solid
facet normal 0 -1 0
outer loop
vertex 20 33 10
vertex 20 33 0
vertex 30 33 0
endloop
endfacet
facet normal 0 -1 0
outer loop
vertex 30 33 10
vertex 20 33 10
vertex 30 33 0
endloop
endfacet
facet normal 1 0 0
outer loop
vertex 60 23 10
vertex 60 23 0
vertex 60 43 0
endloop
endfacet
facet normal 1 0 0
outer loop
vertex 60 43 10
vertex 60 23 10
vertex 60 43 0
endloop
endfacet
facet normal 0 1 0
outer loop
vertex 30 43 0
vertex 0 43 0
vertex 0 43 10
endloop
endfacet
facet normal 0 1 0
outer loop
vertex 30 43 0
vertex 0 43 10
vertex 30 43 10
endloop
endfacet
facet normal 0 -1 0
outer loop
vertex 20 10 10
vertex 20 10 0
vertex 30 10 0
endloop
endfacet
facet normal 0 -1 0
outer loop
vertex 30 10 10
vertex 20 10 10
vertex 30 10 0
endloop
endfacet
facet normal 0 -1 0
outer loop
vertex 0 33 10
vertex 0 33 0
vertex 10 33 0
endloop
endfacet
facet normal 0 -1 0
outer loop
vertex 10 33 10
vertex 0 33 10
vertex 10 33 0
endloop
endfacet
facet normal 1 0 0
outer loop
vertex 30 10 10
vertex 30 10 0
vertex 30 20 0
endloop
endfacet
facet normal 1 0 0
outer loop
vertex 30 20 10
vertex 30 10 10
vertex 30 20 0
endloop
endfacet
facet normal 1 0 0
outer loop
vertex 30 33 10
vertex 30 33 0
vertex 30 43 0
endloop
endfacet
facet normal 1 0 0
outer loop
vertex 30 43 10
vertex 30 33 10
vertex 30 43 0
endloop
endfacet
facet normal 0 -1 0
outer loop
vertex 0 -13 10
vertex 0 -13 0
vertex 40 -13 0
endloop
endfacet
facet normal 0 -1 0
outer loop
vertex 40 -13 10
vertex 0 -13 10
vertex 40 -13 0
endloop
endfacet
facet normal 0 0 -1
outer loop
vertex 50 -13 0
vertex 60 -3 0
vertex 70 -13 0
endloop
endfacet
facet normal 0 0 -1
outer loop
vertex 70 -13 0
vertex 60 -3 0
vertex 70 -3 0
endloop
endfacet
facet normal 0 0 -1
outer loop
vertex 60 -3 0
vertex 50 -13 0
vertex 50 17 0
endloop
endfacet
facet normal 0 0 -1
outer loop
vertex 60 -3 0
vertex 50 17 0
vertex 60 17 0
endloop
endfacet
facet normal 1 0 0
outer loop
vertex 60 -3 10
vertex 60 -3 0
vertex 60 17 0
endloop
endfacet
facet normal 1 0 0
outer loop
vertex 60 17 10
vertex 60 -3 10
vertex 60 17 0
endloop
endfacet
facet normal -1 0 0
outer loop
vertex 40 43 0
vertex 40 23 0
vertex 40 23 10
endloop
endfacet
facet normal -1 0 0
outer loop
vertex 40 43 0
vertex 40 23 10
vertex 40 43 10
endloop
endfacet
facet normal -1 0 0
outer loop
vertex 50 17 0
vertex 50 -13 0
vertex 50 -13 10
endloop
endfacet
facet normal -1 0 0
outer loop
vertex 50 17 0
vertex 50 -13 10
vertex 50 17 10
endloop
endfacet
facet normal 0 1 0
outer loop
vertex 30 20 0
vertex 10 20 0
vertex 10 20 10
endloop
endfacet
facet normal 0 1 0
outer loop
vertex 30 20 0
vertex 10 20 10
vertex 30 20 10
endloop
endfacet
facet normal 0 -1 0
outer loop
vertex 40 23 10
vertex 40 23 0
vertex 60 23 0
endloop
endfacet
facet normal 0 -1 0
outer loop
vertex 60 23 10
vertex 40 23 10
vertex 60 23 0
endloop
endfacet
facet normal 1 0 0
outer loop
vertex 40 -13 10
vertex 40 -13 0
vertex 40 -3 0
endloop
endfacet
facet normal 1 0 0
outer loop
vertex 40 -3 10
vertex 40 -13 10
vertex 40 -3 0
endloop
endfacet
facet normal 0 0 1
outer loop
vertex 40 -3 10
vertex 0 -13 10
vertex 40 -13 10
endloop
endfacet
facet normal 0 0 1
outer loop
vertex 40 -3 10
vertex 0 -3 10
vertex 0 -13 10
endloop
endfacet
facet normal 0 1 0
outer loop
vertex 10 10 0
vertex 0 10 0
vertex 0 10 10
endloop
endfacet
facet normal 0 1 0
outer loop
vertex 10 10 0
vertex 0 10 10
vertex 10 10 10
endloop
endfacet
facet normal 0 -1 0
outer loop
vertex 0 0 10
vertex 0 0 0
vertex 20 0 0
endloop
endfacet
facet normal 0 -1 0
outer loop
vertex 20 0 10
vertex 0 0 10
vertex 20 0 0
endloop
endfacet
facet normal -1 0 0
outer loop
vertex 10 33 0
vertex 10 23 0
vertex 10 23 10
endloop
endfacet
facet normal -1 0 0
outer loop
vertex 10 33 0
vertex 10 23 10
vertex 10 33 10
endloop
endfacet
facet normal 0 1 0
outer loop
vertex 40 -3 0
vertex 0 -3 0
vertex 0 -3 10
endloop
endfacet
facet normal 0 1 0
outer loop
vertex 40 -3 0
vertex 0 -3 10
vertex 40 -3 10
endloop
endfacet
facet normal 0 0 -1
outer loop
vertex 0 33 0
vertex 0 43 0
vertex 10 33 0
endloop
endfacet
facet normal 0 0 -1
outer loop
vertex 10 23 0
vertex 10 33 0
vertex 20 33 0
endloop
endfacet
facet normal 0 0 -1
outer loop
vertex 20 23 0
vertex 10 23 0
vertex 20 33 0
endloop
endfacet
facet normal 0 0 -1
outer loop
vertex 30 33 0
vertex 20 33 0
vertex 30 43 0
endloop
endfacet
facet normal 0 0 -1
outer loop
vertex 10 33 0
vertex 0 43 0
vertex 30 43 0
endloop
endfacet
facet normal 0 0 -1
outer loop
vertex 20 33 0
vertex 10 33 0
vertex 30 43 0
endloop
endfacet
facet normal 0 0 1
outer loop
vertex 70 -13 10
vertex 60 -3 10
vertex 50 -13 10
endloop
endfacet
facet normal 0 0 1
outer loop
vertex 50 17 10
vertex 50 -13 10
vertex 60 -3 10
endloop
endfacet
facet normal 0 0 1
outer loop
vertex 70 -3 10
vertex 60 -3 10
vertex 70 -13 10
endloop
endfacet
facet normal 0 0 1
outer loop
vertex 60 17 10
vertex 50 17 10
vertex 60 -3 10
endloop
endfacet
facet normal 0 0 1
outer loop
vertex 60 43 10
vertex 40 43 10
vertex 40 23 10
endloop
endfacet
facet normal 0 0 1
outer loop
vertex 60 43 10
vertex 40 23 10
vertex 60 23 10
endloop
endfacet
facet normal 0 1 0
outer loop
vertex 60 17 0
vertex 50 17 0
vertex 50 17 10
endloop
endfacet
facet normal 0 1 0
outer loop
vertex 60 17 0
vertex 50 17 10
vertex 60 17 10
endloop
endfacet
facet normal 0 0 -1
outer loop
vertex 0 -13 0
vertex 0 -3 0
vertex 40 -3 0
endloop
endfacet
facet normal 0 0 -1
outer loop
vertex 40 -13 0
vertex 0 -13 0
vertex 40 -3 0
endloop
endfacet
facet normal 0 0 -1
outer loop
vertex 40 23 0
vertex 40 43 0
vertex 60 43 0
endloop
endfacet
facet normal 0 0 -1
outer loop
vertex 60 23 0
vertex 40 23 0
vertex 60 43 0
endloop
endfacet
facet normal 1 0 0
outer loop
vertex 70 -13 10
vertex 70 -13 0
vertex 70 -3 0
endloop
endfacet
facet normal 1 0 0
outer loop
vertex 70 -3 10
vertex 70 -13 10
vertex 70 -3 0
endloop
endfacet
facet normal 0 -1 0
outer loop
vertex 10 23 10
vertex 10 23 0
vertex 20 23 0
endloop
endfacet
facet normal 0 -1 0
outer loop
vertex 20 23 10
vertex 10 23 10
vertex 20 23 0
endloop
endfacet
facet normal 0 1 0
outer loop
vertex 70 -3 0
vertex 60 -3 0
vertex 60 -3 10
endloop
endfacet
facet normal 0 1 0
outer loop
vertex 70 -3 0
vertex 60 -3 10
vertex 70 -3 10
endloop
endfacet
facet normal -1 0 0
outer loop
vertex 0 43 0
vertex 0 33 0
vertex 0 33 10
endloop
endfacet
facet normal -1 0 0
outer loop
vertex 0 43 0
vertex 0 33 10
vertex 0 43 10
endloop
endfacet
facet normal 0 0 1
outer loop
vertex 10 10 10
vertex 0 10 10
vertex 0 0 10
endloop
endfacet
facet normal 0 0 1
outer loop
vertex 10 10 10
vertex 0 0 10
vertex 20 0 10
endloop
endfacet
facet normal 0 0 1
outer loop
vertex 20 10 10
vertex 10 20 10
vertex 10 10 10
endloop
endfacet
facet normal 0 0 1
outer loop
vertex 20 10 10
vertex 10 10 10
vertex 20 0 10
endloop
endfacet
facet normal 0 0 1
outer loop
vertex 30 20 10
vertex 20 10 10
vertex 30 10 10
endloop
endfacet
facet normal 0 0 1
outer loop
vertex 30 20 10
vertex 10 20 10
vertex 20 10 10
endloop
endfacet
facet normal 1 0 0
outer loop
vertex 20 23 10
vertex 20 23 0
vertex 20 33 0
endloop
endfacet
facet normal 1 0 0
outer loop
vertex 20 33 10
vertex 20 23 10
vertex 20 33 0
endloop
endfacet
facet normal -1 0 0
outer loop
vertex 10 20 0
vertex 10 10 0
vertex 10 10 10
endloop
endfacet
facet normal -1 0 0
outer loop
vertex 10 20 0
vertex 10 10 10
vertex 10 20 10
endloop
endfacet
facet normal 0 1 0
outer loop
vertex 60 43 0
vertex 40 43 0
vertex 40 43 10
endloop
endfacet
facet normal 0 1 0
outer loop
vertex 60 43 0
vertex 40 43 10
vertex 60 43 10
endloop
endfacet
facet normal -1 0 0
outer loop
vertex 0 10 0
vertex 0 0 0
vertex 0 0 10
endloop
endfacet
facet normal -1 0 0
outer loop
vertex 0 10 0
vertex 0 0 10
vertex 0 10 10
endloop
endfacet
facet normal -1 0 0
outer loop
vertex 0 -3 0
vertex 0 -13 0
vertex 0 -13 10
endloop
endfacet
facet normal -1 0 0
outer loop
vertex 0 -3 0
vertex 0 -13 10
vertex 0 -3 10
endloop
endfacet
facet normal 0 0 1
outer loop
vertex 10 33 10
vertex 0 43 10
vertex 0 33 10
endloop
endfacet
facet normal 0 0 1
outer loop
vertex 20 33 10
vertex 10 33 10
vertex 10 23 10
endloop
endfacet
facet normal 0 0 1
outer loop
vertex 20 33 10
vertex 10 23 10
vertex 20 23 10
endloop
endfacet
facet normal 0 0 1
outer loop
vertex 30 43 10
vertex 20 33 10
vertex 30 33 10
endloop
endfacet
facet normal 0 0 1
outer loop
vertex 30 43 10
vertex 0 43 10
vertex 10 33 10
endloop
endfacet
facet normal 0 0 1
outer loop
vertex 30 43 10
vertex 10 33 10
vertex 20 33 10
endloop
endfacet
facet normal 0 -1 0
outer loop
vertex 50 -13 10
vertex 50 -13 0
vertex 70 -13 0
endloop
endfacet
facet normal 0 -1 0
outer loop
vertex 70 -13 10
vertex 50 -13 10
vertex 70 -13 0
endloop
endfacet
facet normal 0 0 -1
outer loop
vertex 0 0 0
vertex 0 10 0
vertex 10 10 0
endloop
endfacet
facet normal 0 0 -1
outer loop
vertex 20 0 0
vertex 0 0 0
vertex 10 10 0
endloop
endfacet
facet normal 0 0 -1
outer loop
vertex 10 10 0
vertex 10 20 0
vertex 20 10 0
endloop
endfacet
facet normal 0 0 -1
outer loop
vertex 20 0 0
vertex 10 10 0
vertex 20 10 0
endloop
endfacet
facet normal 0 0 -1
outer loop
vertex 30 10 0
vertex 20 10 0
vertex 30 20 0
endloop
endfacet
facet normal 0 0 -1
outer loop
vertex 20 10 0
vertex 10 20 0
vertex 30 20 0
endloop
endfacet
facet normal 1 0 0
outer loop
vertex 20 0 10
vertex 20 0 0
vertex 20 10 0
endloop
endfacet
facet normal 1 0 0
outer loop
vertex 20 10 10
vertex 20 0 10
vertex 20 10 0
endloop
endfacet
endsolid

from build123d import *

# Parameters (mm, degrees)
BOX001_W     = 10
BOX001_H     = 10
BOX001_DEPTH = 10
BOX002_W     = 10
BOX002_H     = 10
BOX002_DEPTH = 10
BOX003_W     = 10
BOX003_H     = 10
BOX003_DEPTH = 10
BOX_W        = 10
BOX_H        = 10
BOX_DEPTH    = 10
BOX004_W     = 10
BOX004_H     = 10
BOX004_DEPTH = 10
BOX005_W     = 10
BOX005_H     = 10
BOX005_DEPTH = 10
BOX006_W     = 10
BOX006_H     = 10
BOX006_DEPTH = 10
BOX007_W     = 10
BOX007_H     = 10
BOX007_DEPTH = 10
BOX008_W     = 20
BOX008_H     = 10
BOX008_DEPTH = 10
BOX009_W     = 10
BOX009_H     = 20
BOX009_DEPTH = 10
BOX010_W     = 20
BOX010_H     = 20
BOX010_DEPTH = 10
BOX011_W     = 30
BOX011_H     = 10
BOX011_DEPTH = 10
BOX012_W     = 10
BOX012_H     = 10
BOX012_DEPTH = 10


with BuildPart() as cubo2:
    # Box001 → Box001 (new body)
    with BuildSketch(Plane(origin=(10, 0, 0), x_dir=(1, 0, 0), z_dir=(0, 0, 1))):
        with Locations((5, 5)):
            Rectangle(BOX001_W, BOX001_H)
    extrude(amount=BOX001_DEPTH)


with BuildPart() as cubo3:
    # Box002 → Box002 (new body)
    with BuildSketch(Plane(origin=(10, 10, 0), x_dir=(1, 0, 0), z_dir=(0, 0, 1))):
        with Locations((5, 5)):
            Rectangle(BOX002_W, BOX002_H)
    extrude(amount=BOX002_DEPTH)


with BuildPart() as cubo4:
    # Box003 → Box003 (new body)
    with BuildSketch(Plane(origin=(20, 10, 0), x_dir=(1, 0, 0), z_dir=(0, 0, 1))):
        with Locations((5, 5)):
            Rectangle(BOX003_W, BOX003_H)
    extrude(amount=BOX003_DEPTH)


with BuildPart() as pieza1:
    # Box → Box (new body)
    with BuildSketch(Plane.XY):
        with Locations((5, 5)):
            Rectangle(BOX_W, BOX_H)
    extrude(amount=BOX_DEPTH)

    # Fusion: union cubo2, cubo3, cubo4
    add(cubo2.part)
    add(cubo3.part)
    add(cubo4.part)


with BuildPart() as cube:
    # Box004 → Box004 (new body)
    with BuildSketch(Plane(origin=(0, -13, 0), x_dir=(1, 0, 0), z_dir=(0, 0, 1))):
        with Locations((5, 5)):
            Rectangle(BOX004_W, BOX004_H)
    extrude(amount=BOX004_DEPTH)


with BuildPart() as cube001:
    # Box005 → Box005 (new body)
    with BuildSketch(Plane(origin=(10, -13, 0), x_dir=(1, 0, 0), z_dir=(0, 0, 1))):
        with Locations((5, 5)):
            Rectangle(BOX005_W, BOX005_H)
    extrude(amount=BOX005_DEPTH)


with BuildPart() as cube002:
    # Box006 → Box006 (new body)
    with BuildSketch(Plane(origin=(20, -13, 0), x_dir=(1, 0, 0), z_dir=(0, 0, 1))):
        with Locations((5, 5)):
            Rectangle(BOX006_W, BOX006_H)
    extrude(amount=BOX006_DEPTH)


with BuildPart() as fusion001:
    # Box007 → Box007 (new body)
    with BuildSketch(Plane(origin=(30, -13, 0), x_dir=(1, 0, 0), z_dir=(0, 0, 1))):
        with Locations((5, 5)):
            Rectangle(BOX007_W, BOX007_H)
    extrude(amount=BOX007_DEPTH)

    # Fusion001: union Cube, Cube001, Cube002
    add(cube.part)
    add(cube001.part)
    add(cube002.part)


with BuildPart() as cube004:
    # Box008 → Box008 (new body)
    with BuildSketch(Plane(origin=(50, -13, 0), x_dir=(1, 0, 0), z_dir=(0, 0, 1))):
        with Locations((10, 5)):
            Rectangle(BOX008_W, BOX008_H)
    extrude(amount=BOX008_DEPTH)


with BuildPart() as pieza3:
    # Box009 → Box009 (new body)
    with BuildSketch(Plane(origin=(50, -3, 0), x_dir=(1, 0, 0), z_dir=(0, 0, 1))):
        with Locations((5, 10)):
            Rectangle(BOX009_W, BOX009_H)
    extrude(amount=BOX009_DEPTH)

    # Fusion002: union Cube004
    add(cube004.part)


with BuildPart() as pieza4:
    # Box010 → Box010 (new body)
    with BuildSketch(Plane(origin=(40, 23, 0), x_dir=(1, 0, 0), z_dir=(0, 0, 1))):
        with Locations((10, 10)):
            Rectangle(BOX010_W, BOX010_H)
    extrude(amount=BOX010_DEPTH)


with BuildPart() as cube006:
    # Box011 → Box011 (new body)
    with BuildSketch(Plane(origin=(0, 33, 0), x_dir=(1, 0, 0), z_dir=(0, 0, 1))):
        with Locations((15, 5)):
            Rectangle(BOX011_W, BOX011_H)
    extrude(amount=BOX011_DEPTH)


with BuildPart() as pieza5:
    # Box012 → Box012 (new body)
    with BuildSketch(Plane(origin=(10, 23, 0), x_dir=(1, 0, 0), z_dir=(0, 0, 1))):
        with Locations((5, 5)):
            Rectangle(BOX012_W, BOX012_H)
    extrude(amount=BOX012_DEPTH)

    # Fusion003: union Cube006
    add(cube006.part)


solid = Compound([pieza1.part, fusion001.part, pieza3.part, pieza4.part, pieza5.part])
